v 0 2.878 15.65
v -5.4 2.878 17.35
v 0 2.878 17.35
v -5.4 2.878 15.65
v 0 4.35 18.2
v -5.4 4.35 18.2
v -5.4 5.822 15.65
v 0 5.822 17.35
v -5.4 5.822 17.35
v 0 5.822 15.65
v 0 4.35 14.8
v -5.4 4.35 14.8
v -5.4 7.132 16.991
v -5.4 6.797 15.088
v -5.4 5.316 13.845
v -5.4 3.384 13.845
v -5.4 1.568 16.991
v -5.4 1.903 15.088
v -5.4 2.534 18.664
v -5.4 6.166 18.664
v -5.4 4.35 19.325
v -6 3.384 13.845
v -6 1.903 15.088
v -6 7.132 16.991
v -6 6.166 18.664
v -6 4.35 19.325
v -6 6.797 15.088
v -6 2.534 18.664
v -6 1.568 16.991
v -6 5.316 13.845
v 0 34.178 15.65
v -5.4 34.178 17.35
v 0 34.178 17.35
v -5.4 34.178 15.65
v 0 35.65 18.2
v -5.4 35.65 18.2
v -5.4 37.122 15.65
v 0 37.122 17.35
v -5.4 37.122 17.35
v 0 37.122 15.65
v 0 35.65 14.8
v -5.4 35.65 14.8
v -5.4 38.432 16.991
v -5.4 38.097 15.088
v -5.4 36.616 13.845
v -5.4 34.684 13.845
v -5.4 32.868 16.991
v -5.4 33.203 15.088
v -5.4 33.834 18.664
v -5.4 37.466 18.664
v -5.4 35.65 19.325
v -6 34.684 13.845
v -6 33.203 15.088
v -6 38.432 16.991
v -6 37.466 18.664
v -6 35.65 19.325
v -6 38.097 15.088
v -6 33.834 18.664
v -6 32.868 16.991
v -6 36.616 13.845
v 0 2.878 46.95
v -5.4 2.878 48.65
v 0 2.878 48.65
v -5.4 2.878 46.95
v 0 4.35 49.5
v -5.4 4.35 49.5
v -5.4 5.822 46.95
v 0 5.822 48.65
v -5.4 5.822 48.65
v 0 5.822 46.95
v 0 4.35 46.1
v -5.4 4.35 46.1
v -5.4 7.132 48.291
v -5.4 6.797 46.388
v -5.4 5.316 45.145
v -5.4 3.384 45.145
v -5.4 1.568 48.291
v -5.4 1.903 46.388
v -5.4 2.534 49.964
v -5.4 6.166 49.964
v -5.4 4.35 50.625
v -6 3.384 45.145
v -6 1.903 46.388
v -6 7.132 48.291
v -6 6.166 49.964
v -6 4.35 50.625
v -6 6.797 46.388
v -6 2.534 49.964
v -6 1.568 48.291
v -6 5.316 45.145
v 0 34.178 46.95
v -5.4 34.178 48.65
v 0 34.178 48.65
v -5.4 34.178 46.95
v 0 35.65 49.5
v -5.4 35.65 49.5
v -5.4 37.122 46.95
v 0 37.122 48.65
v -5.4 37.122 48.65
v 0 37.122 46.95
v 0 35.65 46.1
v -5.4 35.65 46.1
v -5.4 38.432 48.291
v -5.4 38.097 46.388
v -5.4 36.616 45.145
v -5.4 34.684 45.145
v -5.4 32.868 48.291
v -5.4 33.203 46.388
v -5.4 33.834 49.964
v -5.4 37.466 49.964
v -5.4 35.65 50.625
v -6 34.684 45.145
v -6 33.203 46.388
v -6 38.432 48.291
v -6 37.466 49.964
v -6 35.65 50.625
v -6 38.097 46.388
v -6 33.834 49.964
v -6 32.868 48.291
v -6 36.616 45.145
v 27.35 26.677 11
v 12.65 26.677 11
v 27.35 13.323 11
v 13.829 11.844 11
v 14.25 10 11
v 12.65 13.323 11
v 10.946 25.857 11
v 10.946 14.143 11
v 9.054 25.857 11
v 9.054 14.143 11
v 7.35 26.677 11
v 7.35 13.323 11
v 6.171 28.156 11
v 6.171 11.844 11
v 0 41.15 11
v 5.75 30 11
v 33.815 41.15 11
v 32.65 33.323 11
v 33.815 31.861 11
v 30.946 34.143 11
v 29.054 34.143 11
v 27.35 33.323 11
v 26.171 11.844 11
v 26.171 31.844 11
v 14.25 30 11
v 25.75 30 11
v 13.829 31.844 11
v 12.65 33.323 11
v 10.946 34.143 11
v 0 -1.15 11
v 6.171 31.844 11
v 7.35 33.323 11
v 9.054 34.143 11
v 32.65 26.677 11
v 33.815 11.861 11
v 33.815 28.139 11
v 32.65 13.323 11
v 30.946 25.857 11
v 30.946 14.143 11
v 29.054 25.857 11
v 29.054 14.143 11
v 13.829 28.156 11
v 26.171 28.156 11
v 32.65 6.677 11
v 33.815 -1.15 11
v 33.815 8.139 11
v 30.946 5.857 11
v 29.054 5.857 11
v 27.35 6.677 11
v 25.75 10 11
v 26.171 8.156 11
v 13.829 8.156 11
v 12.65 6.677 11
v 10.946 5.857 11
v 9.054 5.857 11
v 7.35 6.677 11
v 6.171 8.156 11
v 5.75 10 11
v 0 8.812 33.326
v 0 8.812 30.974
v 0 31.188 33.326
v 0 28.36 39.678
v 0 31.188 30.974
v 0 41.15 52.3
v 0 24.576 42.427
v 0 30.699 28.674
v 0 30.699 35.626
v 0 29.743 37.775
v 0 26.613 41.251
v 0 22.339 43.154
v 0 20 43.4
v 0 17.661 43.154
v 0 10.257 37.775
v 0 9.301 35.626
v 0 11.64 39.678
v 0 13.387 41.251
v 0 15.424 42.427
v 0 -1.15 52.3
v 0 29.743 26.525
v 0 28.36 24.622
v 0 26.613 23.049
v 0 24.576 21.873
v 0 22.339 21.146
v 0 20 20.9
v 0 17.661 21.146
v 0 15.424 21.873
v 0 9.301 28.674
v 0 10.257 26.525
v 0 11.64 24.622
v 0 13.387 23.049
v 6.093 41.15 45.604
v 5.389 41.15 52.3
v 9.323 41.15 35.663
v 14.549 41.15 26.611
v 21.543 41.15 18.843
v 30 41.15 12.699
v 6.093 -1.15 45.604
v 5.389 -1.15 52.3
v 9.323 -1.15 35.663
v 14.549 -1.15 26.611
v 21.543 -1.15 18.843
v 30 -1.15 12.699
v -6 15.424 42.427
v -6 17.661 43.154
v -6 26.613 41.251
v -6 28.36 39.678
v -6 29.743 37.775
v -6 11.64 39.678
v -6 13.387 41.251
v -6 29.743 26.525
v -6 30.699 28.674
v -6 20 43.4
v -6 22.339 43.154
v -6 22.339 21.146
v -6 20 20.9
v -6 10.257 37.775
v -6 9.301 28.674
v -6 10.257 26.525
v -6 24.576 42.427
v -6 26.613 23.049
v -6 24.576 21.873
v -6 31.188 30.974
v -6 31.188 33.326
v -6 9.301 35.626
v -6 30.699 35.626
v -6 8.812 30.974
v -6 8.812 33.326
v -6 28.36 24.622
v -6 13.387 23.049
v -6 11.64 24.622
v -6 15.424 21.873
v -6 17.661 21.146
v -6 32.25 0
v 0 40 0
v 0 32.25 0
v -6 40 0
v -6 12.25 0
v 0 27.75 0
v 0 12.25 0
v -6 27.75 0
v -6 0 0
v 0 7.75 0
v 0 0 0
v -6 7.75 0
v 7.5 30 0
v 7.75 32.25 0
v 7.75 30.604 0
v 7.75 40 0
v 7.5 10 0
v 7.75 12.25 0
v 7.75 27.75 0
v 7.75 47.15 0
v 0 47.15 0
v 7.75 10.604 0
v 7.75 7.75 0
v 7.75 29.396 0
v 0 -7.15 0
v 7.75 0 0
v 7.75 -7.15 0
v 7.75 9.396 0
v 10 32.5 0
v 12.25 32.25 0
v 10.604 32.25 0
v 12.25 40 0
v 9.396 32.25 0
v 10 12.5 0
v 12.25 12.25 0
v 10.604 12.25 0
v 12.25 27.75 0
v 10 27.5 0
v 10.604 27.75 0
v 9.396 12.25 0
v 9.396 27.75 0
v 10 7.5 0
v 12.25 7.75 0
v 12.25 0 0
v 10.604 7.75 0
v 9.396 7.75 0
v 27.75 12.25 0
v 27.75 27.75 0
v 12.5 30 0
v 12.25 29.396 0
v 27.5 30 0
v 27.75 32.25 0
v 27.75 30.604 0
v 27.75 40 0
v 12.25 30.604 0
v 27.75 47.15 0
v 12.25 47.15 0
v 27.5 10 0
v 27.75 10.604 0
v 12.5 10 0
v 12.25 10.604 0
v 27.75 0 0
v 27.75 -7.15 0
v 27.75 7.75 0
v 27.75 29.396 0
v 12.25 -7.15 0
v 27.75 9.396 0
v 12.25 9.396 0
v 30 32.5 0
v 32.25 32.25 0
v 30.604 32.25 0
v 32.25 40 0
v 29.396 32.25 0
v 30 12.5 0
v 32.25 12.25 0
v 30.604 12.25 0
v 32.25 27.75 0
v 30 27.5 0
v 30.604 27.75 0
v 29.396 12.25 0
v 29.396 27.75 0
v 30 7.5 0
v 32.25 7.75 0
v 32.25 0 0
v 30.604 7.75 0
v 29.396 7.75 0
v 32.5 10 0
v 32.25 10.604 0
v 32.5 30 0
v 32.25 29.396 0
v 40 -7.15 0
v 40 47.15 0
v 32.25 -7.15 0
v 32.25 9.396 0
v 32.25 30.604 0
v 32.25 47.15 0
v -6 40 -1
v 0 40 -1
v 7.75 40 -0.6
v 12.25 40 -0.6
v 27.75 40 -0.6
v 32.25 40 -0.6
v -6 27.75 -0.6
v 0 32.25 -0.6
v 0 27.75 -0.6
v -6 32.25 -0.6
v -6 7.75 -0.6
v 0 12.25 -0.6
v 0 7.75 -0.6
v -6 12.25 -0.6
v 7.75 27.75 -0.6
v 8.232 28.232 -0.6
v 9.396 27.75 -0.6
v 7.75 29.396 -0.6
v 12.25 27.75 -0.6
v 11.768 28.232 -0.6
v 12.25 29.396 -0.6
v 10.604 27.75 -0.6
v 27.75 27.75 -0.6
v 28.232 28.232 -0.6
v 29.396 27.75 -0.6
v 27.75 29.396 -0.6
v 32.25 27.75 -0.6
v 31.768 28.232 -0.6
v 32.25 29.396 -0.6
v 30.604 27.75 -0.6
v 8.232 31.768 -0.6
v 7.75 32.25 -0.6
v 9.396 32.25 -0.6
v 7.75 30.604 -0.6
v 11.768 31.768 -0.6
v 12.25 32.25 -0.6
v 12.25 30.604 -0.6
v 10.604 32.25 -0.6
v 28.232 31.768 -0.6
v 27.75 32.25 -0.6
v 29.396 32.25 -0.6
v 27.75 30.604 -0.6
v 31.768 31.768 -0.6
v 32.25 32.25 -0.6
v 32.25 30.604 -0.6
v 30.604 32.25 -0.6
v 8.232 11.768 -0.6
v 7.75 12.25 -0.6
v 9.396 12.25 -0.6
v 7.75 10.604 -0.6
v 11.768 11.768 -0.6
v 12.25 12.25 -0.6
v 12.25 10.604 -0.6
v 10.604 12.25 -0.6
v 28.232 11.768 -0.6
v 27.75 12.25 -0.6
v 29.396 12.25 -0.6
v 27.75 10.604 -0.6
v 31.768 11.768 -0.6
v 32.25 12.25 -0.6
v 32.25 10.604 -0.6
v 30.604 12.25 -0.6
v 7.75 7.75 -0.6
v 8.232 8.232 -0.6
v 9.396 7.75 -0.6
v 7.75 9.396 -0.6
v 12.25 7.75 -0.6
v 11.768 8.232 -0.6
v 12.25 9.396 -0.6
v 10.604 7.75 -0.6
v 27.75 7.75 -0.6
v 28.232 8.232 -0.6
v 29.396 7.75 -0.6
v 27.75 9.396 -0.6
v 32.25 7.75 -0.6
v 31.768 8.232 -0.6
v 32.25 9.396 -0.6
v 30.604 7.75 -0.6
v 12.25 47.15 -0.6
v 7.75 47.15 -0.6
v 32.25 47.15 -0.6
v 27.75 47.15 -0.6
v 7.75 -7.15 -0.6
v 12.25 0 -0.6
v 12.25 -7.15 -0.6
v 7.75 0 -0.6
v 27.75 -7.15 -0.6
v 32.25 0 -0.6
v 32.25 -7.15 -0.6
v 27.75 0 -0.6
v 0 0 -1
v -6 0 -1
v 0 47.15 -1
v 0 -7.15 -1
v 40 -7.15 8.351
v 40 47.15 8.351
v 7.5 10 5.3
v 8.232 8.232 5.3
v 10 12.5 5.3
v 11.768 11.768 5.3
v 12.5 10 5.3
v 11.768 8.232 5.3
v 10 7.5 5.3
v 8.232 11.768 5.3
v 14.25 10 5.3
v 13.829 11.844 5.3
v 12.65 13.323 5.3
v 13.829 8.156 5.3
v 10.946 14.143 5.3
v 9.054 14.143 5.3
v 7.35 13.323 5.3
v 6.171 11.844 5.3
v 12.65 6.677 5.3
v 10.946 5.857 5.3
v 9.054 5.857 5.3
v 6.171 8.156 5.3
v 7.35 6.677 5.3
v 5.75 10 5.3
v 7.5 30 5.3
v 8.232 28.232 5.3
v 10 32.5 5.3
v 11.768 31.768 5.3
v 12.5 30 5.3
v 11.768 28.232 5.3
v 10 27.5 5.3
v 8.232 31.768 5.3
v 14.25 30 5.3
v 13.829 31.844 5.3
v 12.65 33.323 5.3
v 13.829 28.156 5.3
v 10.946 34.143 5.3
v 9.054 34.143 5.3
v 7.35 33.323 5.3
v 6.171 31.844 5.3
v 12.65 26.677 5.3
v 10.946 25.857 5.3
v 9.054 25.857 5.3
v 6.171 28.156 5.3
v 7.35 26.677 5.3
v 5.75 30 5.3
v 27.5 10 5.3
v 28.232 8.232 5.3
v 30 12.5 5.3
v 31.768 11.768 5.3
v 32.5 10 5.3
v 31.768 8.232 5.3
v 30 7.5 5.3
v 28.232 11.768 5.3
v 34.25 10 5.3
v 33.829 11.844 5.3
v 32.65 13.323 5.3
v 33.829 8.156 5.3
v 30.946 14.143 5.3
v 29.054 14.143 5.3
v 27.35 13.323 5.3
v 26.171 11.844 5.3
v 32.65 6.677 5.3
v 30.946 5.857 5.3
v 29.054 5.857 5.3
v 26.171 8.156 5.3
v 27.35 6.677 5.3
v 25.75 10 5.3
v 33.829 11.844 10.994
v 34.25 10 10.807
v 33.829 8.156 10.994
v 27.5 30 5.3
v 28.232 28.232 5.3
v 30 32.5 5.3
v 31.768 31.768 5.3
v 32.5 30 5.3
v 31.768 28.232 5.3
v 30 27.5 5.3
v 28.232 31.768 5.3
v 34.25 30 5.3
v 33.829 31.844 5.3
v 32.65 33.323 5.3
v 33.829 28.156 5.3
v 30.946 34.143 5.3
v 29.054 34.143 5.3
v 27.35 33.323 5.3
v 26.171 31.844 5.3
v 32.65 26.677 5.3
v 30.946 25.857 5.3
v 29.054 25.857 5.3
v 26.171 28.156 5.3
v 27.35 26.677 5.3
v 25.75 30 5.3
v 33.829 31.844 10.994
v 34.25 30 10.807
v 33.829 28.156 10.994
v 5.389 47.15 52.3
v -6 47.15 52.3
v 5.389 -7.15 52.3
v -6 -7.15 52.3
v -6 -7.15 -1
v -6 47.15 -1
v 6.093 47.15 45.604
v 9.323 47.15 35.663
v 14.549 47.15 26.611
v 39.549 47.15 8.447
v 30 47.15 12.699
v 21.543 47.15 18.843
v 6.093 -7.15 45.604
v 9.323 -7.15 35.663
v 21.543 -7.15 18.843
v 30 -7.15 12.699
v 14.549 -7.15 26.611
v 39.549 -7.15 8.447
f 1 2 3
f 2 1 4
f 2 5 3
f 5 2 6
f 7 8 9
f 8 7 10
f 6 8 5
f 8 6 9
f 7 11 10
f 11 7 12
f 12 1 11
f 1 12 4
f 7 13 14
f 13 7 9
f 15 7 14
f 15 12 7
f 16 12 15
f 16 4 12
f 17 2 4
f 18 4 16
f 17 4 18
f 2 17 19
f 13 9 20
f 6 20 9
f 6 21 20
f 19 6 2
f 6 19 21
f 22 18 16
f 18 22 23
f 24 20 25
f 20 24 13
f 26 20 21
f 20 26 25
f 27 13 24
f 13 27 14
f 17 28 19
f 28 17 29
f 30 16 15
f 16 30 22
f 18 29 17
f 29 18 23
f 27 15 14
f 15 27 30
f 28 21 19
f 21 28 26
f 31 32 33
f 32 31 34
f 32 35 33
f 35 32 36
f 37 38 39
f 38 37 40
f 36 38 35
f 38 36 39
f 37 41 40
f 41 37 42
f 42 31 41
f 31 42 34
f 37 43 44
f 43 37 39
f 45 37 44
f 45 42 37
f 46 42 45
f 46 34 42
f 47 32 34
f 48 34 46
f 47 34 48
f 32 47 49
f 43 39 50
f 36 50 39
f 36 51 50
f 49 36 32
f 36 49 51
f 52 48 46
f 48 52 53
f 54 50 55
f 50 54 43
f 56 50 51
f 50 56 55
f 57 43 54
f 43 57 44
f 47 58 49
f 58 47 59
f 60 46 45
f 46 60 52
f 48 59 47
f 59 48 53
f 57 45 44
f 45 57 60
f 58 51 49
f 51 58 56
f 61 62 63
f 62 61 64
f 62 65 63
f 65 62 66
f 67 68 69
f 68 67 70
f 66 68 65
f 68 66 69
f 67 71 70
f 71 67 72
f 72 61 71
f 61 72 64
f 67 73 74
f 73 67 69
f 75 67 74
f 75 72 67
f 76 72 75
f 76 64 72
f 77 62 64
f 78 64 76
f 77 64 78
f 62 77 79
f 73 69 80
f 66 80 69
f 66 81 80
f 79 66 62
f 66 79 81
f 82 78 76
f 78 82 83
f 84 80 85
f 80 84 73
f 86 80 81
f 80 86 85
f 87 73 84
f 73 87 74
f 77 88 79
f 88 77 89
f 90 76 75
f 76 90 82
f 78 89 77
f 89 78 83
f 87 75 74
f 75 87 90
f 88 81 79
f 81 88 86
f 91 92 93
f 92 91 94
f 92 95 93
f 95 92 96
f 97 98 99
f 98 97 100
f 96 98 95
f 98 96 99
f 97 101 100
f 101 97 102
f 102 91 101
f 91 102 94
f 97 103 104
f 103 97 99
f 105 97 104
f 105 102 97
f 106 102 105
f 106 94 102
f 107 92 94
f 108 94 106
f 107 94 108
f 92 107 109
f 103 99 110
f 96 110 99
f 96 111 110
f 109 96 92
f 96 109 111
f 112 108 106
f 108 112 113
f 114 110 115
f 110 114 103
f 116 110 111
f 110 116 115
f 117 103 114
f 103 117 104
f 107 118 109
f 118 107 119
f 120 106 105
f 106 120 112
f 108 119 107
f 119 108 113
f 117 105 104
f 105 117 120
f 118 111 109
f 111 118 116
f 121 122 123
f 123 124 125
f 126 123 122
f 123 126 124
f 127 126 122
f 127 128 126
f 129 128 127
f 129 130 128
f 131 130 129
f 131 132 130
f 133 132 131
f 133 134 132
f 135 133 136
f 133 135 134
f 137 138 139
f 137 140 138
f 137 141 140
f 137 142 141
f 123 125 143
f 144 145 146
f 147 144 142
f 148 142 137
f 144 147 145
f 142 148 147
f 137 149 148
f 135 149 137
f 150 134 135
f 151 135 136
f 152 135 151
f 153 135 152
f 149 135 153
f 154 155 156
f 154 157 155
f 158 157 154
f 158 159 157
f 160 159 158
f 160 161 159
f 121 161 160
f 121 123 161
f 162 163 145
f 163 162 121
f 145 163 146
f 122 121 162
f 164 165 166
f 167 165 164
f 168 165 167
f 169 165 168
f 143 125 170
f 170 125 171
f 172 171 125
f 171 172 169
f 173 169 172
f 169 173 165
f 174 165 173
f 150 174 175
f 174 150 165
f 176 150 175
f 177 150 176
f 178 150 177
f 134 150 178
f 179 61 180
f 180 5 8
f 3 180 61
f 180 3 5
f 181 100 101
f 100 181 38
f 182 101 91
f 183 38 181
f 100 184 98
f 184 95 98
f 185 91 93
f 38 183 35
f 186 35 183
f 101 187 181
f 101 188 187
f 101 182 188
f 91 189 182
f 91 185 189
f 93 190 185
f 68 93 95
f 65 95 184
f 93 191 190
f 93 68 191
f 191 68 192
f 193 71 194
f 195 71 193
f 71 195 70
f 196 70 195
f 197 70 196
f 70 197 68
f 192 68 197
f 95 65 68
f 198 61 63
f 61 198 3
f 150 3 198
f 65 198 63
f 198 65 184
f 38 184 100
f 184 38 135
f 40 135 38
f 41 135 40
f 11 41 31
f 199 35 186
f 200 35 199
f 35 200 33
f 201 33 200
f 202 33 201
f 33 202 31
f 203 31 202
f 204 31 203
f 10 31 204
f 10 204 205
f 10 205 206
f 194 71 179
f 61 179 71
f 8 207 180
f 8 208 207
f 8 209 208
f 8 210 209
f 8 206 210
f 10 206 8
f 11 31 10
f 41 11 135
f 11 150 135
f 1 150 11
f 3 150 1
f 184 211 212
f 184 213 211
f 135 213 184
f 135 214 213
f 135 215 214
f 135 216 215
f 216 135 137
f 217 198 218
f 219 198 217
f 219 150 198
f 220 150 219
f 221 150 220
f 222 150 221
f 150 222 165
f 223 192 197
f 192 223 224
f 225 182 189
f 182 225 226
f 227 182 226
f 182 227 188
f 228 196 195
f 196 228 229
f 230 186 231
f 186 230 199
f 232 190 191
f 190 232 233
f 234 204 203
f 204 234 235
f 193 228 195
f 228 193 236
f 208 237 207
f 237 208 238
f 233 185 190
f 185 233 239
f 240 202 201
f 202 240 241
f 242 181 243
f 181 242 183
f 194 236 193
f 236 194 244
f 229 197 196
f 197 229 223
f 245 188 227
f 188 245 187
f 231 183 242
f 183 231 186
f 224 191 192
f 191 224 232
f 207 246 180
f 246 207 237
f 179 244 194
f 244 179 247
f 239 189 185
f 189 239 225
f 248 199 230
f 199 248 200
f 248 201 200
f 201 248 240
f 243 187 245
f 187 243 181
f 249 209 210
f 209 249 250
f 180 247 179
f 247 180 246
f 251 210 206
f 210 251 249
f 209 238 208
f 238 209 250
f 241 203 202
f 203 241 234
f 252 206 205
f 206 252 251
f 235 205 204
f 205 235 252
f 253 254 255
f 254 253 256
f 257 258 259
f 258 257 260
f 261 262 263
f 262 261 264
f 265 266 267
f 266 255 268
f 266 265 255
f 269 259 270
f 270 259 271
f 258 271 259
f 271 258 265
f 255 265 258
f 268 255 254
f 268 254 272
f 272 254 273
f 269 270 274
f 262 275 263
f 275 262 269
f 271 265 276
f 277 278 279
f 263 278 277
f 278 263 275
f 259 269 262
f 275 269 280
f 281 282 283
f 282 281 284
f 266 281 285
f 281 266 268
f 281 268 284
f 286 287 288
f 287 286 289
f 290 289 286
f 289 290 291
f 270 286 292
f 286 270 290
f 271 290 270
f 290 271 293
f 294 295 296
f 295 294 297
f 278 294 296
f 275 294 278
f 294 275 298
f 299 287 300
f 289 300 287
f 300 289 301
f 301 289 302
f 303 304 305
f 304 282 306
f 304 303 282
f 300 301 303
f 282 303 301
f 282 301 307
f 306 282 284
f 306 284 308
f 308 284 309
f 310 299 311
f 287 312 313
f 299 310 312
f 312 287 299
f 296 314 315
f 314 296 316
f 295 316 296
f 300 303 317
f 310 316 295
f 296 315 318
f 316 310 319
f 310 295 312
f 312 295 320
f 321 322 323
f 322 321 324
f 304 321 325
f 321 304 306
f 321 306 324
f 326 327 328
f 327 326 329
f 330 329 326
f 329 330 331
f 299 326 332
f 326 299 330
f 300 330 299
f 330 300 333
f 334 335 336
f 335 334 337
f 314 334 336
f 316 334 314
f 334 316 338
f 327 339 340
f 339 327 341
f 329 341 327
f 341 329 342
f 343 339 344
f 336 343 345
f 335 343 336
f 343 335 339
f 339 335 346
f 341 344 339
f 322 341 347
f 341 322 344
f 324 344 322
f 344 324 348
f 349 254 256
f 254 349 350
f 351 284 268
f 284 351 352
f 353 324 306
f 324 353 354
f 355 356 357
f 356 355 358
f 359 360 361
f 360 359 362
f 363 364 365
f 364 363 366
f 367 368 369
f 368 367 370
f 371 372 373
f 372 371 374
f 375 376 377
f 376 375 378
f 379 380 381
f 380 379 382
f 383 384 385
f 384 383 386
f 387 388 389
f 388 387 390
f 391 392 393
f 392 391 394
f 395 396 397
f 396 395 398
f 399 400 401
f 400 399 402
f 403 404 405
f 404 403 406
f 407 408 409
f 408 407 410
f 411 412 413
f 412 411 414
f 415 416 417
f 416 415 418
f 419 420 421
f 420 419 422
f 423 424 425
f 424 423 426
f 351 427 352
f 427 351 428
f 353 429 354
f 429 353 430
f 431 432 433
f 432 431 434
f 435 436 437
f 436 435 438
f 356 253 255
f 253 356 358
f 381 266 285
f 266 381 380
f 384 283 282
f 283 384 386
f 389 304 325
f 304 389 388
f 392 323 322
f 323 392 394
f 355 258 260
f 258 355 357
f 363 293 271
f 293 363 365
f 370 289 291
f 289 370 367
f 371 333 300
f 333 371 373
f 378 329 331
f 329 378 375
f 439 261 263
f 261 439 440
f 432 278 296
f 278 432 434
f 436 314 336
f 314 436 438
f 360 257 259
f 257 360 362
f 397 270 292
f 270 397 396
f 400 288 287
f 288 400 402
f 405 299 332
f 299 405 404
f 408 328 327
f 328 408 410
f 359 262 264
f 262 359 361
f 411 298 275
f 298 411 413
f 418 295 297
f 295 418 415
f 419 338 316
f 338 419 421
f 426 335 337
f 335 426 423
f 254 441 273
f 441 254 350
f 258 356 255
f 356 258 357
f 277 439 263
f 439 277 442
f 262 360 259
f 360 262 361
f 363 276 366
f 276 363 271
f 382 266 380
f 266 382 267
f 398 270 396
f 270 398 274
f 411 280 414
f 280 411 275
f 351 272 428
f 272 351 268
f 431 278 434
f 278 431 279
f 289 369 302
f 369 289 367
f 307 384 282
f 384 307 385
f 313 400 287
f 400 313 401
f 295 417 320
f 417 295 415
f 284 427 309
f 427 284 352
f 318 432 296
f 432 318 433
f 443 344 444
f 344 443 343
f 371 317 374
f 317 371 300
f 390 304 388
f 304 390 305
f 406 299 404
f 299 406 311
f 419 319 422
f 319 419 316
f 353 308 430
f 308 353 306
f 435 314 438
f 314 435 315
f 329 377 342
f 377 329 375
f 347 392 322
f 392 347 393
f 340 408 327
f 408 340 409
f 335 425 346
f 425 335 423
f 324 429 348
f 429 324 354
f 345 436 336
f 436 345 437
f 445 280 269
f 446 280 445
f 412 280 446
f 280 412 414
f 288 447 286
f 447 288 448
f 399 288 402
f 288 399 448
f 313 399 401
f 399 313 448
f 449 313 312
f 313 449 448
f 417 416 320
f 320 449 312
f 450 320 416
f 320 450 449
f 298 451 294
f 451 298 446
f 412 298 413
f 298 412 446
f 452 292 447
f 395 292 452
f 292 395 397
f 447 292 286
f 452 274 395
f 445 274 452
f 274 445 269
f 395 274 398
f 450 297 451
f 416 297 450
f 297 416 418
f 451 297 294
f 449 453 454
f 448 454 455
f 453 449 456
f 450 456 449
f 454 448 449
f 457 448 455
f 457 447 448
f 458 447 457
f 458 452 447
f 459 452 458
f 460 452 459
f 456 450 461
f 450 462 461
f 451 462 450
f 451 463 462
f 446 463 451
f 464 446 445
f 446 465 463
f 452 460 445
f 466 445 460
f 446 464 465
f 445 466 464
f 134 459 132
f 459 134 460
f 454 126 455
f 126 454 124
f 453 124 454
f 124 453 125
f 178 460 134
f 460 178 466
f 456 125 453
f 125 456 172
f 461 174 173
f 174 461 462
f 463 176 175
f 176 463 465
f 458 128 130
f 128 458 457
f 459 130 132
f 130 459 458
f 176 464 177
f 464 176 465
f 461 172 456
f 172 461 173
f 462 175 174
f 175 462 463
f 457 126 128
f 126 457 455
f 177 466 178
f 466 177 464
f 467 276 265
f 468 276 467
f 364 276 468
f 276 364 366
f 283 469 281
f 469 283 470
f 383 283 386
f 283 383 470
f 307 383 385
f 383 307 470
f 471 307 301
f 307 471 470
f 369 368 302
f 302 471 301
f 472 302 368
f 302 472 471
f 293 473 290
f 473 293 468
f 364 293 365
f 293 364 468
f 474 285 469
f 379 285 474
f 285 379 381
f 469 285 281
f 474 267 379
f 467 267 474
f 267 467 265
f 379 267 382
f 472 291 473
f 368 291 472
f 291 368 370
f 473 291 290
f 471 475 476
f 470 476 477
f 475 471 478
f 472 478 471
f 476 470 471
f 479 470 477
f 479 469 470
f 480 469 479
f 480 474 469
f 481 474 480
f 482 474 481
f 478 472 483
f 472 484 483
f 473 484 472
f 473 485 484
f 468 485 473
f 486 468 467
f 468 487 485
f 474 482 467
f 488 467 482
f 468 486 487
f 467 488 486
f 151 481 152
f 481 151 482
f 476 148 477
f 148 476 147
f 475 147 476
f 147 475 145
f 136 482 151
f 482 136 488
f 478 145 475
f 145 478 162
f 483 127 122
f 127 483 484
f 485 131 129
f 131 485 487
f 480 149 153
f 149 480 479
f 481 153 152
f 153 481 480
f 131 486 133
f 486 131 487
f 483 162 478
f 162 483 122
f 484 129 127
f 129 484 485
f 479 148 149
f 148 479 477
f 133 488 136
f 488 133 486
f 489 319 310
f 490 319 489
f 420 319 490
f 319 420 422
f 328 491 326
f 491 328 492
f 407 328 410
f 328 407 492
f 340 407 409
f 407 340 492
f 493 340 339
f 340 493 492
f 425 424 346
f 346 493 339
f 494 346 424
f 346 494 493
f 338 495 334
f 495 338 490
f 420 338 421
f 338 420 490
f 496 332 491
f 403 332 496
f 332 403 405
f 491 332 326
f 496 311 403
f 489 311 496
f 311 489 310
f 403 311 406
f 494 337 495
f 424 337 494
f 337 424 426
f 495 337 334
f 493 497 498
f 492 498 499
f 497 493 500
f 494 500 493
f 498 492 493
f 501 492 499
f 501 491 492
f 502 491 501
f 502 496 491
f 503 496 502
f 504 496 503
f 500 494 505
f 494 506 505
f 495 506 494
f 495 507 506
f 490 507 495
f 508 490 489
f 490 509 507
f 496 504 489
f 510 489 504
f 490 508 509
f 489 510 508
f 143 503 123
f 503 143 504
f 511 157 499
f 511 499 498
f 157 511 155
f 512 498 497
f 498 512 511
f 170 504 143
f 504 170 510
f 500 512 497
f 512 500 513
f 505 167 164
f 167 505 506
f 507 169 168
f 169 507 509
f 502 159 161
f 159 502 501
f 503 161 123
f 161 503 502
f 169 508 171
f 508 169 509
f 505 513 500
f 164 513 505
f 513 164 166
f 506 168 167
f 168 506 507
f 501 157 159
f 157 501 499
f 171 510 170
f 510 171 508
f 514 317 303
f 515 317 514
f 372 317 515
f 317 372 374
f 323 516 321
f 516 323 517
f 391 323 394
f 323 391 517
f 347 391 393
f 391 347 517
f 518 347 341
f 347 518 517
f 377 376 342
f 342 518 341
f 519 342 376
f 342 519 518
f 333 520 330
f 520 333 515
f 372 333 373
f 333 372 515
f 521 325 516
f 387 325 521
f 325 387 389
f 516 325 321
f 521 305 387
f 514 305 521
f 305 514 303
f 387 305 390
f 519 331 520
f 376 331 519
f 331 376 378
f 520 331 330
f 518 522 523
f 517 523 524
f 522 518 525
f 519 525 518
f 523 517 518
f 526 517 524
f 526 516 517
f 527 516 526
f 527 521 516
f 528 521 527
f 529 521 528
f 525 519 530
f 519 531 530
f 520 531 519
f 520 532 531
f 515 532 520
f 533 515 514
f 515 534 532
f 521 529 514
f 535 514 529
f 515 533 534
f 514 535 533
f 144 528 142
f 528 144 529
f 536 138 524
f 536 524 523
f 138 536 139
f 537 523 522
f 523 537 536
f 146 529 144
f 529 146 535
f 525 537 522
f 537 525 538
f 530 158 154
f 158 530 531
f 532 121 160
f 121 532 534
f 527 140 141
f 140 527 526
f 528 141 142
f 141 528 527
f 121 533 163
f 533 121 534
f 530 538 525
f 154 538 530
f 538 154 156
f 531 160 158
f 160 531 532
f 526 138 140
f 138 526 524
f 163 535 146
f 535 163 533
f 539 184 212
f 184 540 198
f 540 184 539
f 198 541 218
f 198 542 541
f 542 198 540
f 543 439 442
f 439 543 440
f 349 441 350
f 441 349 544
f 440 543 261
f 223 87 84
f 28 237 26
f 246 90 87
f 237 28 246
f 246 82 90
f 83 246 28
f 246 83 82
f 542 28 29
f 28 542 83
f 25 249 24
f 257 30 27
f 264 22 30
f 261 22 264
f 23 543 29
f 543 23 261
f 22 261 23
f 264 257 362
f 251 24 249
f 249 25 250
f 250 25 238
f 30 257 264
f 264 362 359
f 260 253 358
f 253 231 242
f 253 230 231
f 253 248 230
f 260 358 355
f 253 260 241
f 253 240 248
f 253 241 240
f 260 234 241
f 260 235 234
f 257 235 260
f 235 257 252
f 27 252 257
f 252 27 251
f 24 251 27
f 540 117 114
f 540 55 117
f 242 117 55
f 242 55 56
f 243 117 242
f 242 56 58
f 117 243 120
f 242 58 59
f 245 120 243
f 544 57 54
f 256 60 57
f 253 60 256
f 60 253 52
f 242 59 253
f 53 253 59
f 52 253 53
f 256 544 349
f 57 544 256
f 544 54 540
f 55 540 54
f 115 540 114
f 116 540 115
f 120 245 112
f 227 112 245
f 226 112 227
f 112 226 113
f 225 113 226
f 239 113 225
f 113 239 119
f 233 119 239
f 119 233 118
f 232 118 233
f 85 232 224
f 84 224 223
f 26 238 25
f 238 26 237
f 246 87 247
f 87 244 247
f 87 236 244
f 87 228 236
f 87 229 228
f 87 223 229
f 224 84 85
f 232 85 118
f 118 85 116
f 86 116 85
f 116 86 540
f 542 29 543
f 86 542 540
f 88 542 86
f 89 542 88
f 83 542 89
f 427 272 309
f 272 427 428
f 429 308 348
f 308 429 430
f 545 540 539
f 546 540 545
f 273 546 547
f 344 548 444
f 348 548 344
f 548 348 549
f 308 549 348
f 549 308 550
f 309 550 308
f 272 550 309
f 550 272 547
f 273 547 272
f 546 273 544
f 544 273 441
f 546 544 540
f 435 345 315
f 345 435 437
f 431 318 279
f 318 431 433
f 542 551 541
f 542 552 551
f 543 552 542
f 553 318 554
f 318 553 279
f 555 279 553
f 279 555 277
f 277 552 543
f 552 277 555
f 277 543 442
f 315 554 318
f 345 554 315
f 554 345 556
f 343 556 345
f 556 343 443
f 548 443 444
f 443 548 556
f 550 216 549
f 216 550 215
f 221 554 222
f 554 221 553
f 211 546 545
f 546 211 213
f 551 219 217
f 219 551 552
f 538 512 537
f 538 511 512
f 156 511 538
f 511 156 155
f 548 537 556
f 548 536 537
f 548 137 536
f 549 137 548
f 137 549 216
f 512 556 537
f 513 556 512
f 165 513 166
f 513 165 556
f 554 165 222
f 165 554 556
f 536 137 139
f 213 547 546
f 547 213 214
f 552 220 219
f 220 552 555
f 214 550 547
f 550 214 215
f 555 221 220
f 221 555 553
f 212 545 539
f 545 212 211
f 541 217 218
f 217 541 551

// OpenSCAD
wallThickness = 6;

nema17Width=42.30;
slotWidth=4.5;
slotHeight=0.6;

difference(){
	translate([-wallThickness,-(nema17Width-40)/2-wallThickness,-1])cube([40+wallThickness,nema17Width+(wallThickness*2),nema17Width+wallThickness+5]);
	translate([0,-(nema17Width-40)/2,wallThickness+5])nema17Big();
	translate([-100,0,-40])profile5_40x40(200);
	rotate([0,0,90])translate([-100,-40,-40])profile5_40x40(200);
	#translate([10,10,-slotHeight-0.1])m5Screw(6,6);
	translate([10,30,-slotHeight-0.1])m5Screw(6,6);
	translate([30,10,-slotHeight-0.1])m5Screw(6,6);
	translate([30,30,-slotHeight-0.1])m5Screw(6,6);
	translate([55,50,56])rotate([90,0,0])cylinder(h=60,r=50);
}

module nema17Big(){
	union(){
		cube([60,nema17Width,nema17Width]);
		translate([0,nema17Width/2,nema17Width/2])rotate([0,-90,0])cylinder(h=22,r=6/2);
		translate([0.1,nema17Width/2,nema17Width/2])rotate([0,-90,0])cylinder(h=0.2+wallThickness,r=22.5/2);
		translate([0.1,5.5,5.5])rotate([0,-90,0])m3Screw(5.5,40);
		translate([0.1,nema17Width-5.5,5.5])rotate([0,-90,0])m3Screw(5.5,40);
		translate([0.1,5.5,nema17Width-5.5])rotate([0,-90,0])m3Screw(5.5,40);
		translate([0.1,nema17Width-5.5,nema17Width-5.5])rotate([0,-90,0])m3Screw(5.5,40);
	}
}

module m3Screw(h=10,headH=3) {
	union() {
		cylinder(h=h,r=1.7);
		translate([0,0,h])cylinder(h=headH,r=5.65/2);
	}
}

module m5Screw(h=10,headH=5.5) {
	union() {
		cylinder(h=h,r=2.5);
		translate([0,0,h])cylinder(h=headH,r=4.25);
	}
}

module profile5_20x20(l=100) {
	difference(){
		cube([l,20,20]);
		translate([0,(20/2)-slotWidth/2,0])cube([l,slotWidth,slotHeight]);
		translate([0,(20/2)-slotWidth/2,20-slotHeight])cube([l,slotWidth,slotHeight]);
		translate([0,0,(20/2)-(slotWidth/2)])cube([l,slotHeight,slotWidth]);
		translate([0,20-slotHeight,(20/2)-(slotWidth/2)])cube([l,slotHeight,slotWidth]);
		
	}
	
}

module profile5_40x40(l=100) {
	union(){
		profile5_20x20(l);
		translate([0,20,0])profile5_20x20(l);
		translate([0,20,20])profile5_20x20(l);
		translate([0,0,20])profile5_20x20(l);
	}
	
}
